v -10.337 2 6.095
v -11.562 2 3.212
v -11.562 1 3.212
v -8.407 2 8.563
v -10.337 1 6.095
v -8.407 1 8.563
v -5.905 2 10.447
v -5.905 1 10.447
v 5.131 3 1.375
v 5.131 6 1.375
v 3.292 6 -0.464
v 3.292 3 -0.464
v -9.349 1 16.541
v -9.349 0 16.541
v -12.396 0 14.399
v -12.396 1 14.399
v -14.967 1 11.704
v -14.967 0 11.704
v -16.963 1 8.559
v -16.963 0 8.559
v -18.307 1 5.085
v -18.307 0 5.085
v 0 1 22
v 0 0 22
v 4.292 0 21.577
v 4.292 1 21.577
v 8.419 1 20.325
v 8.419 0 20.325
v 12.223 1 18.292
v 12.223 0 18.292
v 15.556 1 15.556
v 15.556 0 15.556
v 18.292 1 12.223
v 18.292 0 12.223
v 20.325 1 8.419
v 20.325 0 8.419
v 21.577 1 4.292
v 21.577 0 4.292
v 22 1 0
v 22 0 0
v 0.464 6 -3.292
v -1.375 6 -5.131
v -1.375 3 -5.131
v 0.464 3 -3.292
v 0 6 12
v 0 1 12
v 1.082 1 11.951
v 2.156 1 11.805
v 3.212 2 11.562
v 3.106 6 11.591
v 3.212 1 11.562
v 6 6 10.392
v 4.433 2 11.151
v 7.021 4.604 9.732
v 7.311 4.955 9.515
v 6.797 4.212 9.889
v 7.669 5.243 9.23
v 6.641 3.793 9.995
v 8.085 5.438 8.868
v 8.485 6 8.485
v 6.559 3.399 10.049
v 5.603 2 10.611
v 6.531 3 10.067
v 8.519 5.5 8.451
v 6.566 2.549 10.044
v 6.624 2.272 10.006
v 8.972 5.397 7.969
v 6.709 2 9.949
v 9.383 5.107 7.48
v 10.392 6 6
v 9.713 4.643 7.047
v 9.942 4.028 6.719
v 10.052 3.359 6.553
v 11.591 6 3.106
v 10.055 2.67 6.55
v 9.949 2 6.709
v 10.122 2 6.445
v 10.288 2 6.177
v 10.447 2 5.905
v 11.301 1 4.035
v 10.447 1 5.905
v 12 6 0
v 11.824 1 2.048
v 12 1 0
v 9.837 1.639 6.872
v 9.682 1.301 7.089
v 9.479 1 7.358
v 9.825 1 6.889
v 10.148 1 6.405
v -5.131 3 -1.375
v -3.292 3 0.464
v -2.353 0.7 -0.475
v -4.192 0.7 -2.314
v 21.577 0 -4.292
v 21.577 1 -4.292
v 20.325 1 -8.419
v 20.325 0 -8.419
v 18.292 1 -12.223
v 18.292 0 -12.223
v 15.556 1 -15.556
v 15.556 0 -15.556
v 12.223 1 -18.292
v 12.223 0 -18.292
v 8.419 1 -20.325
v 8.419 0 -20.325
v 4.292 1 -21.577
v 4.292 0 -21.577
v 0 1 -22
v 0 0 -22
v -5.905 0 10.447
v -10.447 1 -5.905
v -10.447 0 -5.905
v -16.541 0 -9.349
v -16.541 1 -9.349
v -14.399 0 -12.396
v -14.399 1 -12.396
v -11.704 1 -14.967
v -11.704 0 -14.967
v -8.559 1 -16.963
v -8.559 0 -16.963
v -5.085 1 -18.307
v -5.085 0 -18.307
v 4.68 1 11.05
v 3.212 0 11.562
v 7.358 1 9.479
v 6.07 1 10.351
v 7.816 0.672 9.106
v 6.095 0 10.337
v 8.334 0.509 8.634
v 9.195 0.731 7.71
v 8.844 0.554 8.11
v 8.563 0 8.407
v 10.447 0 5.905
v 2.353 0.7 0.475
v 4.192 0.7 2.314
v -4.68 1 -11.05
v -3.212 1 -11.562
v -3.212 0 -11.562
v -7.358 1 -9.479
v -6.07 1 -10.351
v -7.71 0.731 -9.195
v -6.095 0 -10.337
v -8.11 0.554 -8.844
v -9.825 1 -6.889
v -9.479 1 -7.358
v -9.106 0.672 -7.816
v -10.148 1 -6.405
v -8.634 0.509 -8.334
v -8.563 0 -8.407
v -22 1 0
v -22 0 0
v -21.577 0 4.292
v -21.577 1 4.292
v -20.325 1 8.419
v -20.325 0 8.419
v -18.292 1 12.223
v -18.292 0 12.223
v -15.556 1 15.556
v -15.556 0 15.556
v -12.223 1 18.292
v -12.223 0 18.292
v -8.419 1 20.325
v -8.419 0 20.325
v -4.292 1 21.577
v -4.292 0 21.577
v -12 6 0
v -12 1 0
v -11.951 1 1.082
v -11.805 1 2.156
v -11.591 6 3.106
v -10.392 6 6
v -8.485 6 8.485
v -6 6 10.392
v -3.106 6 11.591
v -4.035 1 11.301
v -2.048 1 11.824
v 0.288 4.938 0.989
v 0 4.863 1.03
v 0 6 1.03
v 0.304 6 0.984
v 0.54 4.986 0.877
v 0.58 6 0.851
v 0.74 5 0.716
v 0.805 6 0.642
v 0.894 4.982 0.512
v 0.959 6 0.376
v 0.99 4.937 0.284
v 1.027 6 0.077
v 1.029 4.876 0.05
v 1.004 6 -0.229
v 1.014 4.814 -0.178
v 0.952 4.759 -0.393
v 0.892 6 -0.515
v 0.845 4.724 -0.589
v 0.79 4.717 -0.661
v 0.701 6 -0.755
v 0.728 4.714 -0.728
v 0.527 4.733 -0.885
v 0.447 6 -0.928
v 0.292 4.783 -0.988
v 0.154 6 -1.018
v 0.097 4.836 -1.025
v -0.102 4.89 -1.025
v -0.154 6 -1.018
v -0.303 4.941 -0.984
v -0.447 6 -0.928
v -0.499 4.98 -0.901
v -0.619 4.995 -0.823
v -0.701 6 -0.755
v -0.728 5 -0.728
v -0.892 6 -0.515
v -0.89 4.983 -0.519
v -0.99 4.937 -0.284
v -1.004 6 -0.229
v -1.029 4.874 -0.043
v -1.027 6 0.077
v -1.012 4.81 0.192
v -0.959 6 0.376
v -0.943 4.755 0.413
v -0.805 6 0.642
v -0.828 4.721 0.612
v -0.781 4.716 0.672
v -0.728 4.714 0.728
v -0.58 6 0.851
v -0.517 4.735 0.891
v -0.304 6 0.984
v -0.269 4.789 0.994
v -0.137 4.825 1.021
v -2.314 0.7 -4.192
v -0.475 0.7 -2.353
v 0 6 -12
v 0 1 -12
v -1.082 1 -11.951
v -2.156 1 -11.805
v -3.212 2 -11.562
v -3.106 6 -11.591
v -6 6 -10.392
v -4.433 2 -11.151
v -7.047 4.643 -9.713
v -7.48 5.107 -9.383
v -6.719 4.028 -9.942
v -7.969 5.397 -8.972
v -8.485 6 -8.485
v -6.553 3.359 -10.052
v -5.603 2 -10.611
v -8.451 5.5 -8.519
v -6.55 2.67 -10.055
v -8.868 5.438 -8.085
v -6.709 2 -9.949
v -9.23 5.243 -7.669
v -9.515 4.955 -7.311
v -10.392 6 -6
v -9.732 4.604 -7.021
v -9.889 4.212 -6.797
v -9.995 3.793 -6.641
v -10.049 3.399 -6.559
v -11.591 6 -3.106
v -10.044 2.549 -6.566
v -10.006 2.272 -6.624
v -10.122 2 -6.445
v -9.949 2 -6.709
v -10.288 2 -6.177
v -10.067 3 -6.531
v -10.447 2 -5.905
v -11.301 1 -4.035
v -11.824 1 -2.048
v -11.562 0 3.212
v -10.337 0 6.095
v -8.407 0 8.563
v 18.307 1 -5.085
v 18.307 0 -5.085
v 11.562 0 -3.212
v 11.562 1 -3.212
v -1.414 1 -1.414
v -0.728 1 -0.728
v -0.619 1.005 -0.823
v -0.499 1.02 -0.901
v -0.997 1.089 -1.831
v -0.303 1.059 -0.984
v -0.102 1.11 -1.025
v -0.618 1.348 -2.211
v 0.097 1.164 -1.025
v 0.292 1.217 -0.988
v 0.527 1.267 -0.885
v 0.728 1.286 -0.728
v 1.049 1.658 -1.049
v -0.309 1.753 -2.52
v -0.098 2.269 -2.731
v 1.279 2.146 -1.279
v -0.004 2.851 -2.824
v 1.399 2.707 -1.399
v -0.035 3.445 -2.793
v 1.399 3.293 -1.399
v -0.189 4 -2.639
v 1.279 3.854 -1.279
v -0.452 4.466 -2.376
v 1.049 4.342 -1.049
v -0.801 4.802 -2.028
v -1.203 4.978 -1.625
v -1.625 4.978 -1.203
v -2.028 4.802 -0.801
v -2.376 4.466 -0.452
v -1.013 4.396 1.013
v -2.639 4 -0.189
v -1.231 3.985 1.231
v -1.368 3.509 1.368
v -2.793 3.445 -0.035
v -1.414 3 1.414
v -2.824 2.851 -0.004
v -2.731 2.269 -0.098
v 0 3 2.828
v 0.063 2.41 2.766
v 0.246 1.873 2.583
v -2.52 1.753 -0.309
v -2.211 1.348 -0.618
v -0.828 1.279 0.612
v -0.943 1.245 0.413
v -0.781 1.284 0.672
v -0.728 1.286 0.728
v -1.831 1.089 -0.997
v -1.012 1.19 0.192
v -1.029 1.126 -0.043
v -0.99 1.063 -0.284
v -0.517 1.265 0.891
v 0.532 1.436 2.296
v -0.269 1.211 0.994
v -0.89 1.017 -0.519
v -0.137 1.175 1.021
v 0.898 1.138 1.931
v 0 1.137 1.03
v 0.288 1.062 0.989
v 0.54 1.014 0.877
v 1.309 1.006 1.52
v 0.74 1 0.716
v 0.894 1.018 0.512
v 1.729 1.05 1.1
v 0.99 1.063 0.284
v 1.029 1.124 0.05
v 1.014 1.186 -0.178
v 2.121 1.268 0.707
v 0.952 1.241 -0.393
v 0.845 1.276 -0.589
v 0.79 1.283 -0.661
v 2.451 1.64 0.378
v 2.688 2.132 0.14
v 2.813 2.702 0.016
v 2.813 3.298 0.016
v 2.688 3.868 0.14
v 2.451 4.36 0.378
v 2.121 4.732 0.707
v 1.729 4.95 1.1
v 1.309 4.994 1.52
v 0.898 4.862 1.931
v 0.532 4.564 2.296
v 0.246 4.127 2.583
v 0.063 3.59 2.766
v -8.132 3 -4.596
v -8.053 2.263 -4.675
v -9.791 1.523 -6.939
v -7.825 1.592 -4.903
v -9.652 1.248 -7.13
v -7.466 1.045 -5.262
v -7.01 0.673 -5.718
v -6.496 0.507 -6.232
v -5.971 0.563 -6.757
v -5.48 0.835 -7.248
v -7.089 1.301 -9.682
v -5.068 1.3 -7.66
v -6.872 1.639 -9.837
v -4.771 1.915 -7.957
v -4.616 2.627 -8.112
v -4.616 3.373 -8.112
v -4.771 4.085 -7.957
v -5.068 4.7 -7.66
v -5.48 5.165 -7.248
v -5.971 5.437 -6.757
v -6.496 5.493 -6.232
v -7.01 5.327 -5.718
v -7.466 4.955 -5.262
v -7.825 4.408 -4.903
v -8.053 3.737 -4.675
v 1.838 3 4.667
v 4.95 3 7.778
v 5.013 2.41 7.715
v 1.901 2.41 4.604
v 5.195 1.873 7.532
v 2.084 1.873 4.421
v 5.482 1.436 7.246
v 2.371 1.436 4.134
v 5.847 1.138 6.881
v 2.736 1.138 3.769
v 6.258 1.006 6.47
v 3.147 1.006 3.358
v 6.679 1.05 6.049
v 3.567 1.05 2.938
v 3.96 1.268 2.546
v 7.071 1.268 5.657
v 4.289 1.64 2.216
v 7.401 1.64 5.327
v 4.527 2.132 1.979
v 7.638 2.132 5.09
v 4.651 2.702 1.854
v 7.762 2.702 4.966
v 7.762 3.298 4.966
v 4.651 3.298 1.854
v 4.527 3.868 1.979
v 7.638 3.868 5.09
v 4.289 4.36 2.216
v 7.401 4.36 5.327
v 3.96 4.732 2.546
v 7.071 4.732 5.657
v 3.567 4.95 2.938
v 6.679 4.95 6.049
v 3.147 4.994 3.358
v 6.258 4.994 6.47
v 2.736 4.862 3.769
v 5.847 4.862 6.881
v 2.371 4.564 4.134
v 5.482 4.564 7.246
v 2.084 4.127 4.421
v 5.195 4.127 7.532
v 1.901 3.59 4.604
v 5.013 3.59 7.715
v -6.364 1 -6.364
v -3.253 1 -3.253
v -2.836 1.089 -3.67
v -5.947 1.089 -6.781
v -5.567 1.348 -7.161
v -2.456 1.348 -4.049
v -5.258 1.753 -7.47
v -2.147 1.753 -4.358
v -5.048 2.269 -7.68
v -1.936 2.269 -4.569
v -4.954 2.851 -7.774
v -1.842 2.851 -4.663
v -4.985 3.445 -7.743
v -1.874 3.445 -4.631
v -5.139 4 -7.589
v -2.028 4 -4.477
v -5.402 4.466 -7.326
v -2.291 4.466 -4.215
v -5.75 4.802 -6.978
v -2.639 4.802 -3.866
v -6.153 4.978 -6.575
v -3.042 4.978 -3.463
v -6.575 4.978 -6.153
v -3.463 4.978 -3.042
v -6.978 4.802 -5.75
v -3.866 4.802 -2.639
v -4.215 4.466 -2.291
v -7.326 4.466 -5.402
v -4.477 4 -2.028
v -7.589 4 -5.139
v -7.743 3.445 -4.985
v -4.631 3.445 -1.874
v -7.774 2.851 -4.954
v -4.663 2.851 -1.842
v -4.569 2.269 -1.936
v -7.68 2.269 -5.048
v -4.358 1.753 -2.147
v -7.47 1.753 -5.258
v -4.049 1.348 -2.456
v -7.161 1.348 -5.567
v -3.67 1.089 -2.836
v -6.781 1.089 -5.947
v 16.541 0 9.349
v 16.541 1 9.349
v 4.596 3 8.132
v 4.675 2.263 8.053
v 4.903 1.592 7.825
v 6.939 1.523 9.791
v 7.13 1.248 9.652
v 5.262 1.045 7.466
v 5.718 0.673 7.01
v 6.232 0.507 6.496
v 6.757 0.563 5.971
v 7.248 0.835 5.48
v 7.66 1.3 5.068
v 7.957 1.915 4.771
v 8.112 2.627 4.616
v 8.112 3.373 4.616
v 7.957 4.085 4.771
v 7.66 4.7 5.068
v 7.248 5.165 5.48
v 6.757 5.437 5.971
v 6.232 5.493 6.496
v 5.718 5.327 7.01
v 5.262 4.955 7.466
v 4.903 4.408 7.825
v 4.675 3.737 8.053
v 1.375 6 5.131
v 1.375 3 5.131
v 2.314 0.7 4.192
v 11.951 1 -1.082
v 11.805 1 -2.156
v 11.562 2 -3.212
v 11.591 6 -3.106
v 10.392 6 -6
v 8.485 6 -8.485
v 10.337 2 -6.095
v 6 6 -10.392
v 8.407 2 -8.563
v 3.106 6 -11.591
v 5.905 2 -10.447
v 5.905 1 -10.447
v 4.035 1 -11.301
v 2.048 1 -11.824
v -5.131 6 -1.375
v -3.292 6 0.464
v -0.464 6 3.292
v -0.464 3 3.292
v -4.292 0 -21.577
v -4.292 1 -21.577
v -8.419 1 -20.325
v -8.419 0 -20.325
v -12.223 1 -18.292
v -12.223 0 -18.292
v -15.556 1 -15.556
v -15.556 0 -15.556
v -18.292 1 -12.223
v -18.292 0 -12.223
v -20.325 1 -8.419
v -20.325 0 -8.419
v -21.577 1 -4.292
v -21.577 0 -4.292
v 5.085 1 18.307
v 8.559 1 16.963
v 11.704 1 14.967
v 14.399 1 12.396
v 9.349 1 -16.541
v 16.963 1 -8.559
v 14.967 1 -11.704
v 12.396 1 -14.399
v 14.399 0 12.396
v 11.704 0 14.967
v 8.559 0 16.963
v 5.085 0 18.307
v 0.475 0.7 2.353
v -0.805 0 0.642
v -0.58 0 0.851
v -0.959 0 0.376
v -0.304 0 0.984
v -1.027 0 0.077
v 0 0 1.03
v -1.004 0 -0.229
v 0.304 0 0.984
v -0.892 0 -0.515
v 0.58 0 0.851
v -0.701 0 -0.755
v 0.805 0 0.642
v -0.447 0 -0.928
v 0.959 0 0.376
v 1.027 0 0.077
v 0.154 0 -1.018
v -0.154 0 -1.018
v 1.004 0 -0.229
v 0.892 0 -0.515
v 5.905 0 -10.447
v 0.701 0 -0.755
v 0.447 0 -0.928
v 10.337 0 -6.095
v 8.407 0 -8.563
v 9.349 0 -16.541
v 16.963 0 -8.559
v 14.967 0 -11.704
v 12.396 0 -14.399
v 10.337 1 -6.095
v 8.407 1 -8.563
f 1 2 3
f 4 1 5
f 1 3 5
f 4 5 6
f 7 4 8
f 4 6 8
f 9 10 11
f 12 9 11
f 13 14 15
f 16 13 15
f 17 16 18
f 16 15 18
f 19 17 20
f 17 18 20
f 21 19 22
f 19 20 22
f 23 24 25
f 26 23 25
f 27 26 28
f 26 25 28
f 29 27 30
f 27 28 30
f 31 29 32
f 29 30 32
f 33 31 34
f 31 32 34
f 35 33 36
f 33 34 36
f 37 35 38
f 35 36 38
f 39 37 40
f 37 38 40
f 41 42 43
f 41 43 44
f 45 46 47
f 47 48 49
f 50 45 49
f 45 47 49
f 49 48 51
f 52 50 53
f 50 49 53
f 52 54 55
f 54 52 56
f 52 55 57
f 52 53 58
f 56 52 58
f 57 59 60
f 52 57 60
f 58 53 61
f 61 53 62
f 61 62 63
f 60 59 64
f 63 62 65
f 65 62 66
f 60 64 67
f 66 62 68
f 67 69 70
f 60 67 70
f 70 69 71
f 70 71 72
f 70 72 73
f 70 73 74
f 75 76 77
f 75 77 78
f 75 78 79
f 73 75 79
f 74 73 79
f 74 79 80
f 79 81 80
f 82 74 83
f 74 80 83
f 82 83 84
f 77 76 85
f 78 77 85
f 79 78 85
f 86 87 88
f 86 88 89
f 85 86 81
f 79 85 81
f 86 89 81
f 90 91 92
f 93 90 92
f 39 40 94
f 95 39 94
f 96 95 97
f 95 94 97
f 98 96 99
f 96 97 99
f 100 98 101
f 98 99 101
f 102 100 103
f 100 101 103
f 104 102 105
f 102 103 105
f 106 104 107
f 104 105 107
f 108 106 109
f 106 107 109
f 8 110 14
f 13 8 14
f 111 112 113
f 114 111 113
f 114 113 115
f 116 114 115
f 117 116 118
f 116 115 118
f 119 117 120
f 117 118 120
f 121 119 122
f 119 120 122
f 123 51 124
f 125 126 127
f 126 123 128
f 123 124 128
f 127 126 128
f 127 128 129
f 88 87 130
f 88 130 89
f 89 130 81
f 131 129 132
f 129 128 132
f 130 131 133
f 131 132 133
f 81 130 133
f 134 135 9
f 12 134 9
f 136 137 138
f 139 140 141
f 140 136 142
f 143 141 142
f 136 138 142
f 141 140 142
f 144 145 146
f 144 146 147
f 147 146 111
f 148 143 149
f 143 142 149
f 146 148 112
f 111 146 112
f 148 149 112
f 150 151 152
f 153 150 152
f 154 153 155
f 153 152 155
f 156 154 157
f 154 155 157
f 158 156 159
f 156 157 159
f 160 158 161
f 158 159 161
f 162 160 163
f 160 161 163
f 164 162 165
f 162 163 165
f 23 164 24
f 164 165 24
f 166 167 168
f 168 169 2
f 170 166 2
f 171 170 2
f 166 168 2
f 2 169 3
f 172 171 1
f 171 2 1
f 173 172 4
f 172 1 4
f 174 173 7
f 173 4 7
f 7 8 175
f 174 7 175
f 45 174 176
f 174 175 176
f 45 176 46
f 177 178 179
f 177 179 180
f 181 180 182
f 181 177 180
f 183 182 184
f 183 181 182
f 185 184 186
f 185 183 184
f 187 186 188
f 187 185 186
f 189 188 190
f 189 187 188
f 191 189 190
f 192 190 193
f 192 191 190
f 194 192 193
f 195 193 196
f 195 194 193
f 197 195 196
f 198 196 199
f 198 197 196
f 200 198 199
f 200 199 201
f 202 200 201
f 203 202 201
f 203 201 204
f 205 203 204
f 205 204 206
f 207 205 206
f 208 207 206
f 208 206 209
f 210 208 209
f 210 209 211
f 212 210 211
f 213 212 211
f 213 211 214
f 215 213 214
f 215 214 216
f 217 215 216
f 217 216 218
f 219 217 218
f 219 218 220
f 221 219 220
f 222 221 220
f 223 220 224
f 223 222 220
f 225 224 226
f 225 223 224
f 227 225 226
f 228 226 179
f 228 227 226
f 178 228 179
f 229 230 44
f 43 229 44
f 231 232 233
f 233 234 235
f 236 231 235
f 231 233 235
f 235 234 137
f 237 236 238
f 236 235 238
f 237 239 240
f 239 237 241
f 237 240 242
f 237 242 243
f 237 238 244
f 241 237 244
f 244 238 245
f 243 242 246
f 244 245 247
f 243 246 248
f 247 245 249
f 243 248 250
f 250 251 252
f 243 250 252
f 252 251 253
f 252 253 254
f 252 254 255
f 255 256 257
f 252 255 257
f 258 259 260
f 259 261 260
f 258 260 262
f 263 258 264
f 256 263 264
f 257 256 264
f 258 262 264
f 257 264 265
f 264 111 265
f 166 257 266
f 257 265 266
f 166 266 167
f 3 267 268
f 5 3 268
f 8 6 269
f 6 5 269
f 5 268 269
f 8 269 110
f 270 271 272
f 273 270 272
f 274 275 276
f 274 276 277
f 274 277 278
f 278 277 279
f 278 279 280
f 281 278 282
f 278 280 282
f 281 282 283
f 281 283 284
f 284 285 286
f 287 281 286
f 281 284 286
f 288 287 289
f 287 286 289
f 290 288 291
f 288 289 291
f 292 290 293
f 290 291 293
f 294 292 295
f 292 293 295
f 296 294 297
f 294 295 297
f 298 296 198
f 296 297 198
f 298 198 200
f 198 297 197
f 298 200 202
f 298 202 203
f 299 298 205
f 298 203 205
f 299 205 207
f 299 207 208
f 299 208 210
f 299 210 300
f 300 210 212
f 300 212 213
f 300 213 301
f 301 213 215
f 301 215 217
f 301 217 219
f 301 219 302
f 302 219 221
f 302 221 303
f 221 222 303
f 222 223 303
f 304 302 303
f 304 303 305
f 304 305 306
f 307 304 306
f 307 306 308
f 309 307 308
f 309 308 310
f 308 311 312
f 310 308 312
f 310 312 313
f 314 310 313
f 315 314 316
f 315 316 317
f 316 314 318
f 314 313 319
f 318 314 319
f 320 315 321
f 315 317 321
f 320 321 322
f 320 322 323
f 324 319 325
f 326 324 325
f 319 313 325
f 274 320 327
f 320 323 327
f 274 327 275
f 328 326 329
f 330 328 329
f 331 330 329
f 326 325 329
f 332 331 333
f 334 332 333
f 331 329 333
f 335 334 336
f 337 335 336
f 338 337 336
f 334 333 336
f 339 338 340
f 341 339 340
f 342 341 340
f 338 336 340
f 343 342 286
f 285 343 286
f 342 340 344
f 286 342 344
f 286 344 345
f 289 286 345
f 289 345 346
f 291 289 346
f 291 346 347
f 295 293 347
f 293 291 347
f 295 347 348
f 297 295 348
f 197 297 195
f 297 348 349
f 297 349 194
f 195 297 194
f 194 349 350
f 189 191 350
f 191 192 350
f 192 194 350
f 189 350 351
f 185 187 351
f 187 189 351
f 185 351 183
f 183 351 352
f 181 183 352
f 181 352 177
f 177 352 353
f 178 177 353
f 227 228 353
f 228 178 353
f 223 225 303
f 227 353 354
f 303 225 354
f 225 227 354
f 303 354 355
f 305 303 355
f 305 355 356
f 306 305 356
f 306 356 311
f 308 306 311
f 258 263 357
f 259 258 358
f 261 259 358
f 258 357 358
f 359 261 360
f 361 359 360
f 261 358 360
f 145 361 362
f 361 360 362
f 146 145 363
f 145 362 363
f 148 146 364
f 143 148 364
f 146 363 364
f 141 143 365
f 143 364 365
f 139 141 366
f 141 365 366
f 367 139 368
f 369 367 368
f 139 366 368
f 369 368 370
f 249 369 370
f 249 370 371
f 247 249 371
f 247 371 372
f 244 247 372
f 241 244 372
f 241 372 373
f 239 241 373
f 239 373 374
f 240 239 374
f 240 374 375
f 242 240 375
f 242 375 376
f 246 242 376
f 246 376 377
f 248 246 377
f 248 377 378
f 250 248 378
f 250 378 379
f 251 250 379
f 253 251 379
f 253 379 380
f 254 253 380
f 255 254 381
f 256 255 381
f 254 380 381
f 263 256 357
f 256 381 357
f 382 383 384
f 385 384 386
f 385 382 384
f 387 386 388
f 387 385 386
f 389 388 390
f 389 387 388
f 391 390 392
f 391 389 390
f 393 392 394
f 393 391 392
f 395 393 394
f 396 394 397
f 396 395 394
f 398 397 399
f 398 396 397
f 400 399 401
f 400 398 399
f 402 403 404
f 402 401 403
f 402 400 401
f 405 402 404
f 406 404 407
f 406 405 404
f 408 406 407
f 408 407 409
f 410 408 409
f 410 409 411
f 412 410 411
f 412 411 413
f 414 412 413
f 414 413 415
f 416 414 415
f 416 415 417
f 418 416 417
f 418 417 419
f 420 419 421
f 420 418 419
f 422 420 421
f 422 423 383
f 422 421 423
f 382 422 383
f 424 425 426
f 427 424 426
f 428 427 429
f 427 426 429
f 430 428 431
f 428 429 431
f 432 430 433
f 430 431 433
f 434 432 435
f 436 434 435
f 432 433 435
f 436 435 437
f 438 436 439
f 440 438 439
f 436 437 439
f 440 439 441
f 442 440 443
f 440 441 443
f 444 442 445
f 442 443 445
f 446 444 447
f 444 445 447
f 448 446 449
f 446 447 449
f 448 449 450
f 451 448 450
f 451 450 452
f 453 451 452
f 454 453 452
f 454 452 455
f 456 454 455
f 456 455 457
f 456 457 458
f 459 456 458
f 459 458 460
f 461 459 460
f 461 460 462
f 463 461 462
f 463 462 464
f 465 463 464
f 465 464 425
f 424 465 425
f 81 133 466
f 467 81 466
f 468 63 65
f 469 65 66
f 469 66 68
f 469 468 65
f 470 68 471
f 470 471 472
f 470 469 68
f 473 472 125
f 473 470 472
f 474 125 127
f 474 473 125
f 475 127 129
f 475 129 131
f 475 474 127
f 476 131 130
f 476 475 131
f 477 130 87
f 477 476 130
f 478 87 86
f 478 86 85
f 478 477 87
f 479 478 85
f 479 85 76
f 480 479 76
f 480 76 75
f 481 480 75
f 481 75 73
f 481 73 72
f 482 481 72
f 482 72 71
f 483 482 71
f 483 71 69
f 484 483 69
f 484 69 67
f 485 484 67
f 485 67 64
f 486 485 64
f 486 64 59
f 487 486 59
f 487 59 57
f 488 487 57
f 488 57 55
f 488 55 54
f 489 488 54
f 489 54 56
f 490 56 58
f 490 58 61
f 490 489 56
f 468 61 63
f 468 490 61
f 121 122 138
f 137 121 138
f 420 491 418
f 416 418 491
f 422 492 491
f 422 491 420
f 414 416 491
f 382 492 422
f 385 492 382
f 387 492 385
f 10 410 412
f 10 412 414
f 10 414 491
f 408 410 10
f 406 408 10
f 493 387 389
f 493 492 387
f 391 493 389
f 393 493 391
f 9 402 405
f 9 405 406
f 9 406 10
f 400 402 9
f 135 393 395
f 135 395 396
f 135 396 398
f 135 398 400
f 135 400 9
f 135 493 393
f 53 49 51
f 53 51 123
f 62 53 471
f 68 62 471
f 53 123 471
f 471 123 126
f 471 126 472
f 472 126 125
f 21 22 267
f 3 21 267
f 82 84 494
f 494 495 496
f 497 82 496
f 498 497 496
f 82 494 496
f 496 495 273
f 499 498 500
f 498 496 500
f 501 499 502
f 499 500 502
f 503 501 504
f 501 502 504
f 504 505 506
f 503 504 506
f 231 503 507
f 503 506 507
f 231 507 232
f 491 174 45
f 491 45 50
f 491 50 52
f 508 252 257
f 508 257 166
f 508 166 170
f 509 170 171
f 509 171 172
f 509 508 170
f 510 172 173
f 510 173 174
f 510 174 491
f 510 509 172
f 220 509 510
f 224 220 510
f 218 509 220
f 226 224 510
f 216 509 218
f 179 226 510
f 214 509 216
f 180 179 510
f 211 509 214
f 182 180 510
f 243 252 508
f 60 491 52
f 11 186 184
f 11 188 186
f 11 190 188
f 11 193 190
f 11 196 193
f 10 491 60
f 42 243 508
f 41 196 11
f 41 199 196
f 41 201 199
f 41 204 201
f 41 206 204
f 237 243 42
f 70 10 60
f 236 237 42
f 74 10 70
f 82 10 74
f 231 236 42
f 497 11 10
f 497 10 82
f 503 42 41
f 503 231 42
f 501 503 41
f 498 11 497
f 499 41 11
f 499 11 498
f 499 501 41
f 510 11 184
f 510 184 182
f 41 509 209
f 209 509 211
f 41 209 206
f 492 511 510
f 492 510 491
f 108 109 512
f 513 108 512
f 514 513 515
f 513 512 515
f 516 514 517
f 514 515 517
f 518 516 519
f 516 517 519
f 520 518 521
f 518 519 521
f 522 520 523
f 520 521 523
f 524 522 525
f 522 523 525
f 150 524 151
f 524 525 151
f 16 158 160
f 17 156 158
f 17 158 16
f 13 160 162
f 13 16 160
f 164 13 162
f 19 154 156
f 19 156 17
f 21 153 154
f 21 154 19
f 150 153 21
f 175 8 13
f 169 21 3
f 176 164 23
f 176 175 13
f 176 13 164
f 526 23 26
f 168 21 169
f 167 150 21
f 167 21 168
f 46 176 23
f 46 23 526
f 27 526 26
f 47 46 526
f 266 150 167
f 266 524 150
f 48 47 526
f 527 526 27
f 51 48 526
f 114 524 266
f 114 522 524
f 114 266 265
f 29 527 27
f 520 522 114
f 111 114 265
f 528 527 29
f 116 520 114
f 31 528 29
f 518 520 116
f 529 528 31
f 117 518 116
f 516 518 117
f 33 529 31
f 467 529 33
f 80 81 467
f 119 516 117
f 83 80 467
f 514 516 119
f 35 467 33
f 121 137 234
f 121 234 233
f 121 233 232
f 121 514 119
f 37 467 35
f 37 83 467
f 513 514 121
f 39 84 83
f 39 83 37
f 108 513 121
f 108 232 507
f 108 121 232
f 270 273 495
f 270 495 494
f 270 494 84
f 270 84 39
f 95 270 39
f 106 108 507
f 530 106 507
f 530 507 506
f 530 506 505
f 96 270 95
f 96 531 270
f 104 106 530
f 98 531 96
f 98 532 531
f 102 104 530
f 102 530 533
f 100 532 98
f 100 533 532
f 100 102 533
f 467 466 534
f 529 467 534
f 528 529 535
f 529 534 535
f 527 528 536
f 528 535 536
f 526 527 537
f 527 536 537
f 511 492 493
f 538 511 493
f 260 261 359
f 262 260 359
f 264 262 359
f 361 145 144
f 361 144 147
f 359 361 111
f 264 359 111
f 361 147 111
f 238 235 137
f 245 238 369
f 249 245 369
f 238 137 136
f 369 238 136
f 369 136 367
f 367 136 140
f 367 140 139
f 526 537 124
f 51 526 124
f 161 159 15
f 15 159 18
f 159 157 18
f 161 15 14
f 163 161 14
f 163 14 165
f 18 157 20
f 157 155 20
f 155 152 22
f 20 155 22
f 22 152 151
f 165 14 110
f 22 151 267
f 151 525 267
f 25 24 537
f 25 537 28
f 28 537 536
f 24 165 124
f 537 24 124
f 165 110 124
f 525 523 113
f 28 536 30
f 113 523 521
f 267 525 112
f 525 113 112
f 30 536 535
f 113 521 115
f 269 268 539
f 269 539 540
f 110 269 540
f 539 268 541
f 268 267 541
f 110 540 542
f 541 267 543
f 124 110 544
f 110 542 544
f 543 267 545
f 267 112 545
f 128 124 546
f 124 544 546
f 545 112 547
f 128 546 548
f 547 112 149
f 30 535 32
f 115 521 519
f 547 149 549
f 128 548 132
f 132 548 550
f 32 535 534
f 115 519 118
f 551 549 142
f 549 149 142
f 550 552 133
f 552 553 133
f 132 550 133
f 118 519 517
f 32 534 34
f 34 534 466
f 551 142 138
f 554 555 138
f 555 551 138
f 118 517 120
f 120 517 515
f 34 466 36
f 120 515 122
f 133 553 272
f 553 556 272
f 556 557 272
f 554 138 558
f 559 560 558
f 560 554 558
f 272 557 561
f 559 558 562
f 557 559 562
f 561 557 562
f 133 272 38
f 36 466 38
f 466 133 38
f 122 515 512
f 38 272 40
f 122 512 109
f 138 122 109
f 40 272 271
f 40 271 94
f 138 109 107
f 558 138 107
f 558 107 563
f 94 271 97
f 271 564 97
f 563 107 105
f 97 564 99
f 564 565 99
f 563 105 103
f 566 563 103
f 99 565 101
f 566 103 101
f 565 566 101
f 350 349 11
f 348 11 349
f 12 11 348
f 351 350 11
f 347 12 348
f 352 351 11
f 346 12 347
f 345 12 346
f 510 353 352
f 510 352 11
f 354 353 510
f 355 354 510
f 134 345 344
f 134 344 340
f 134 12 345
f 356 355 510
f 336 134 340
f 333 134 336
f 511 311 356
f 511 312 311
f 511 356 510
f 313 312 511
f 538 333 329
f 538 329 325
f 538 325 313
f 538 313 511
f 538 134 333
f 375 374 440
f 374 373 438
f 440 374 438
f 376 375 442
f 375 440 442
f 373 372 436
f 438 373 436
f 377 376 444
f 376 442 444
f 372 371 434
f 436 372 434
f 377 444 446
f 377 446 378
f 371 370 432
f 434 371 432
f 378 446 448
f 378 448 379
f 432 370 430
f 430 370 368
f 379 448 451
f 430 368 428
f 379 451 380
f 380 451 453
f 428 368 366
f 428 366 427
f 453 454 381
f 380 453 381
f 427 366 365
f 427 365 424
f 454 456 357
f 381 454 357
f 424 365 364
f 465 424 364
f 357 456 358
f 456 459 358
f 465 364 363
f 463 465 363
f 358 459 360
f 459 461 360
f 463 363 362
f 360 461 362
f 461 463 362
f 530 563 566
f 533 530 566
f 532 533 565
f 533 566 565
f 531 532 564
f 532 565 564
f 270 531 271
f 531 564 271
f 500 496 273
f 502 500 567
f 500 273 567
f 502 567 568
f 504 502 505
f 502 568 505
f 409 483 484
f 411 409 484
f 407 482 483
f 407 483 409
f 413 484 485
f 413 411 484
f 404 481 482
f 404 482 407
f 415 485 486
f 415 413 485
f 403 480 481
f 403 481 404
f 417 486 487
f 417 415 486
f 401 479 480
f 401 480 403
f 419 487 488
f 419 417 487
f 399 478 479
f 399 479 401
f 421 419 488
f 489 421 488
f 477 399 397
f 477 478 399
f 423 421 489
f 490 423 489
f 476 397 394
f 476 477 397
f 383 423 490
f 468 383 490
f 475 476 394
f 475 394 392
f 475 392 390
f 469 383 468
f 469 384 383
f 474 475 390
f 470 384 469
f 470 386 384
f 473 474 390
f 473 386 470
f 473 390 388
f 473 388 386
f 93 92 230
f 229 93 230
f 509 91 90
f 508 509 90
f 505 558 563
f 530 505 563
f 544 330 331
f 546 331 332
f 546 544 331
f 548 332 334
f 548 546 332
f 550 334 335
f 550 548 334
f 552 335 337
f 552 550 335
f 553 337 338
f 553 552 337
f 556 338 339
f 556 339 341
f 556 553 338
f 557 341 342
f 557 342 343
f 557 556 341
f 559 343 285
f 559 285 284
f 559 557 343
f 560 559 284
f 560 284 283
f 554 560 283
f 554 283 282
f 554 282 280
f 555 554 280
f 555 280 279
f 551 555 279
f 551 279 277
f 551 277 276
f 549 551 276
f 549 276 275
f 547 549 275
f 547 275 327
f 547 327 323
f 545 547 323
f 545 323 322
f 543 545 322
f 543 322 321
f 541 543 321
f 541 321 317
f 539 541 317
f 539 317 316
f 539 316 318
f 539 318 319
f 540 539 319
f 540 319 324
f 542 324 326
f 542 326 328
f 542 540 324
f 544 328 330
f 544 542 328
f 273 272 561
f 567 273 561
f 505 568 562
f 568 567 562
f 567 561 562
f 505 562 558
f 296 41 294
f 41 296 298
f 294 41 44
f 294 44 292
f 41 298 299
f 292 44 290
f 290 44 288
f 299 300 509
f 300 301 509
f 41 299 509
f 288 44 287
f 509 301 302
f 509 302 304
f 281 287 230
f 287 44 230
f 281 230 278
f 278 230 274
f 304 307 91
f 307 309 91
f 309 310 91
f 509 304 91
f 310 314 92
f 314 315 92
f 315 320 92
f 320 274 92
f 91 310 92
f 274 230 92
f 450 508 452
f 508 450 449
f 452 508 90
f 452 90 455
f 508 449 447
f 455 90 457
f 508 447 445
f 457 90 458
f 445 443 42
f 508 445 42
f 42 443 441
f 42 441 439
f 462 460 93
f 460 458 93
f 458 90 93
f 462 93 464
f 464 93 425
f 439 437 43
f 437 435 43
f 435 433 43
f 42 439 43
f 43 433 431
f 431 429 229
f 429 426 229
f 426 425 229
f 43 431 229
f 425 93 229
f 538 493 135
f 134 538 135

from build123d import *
from build123d.topology import SkipClean

# Parameters (mm, degrees)
SALIENTE_EXTRUIR4_DEPTH    = 6
CROQUIS10_R                = 1.03
SALIENTE_EXTRUIR5_DEPTH    = 3
CROQUIS10_3_R              = 1.03
CORTAR_EXTRUIR7_DEPTH      = 6
CORTAR_EXTRUIR8_REACH      = 20
CORTAR_EXTRUIR8_END_RADIUS = 12
CROQUIS11_R                = 2
CORTAR_EXTRUIR11_START     = 9
CROQUIS11_3_R              = 2.5
CORTAR_EXTRUIR11_DEPTH     = 10.000000167
CORTAR_EXTRUIR9_START      = 4.6
CORTAR_EXTRUIR9_DEPTH      = 2.6
CORTAR_EXTRUIR12_REACH     = 20
CORTAR_EXTRUIR10_START     = -3
CORTAR_EXTRUIR10_DEPTH     = 3
CORTAR_EXTRUIR13_START     = -9
CROQUIS11_5_R              = 2.5
CORTAR_EXTRUIR13_DEPTH     = 10.000000167
CORTAR_EXTRUIR14_START     = -2
CORTAR_EXTRUIR14_DEPTH     = 2.6
CORTAR_EXTRUIR15_START     = -3
CORTAR_EXTRUIR15_DEPTH     = 3
SALIENTE_EXTRUIR6_DEPTH    = 1
CORTAR_EXTRUIR17_DEPTH     = 2


with BuildPart() as part:
    # Croquis1 → Saliente-Extruir4 (new body)
    with BuildSketch(Plane(origin=(0, 0, 0), x_dir=(1, 0, 0), z_dir=(0, 1, 0))):
        with BuildLine():
            Line((0, -12), (0, 0))
            Line((0, 0), (-12, 0))
            ThreePointArc((-12, 0), (-8.485281374, -8.485281374), (0, -12))
        make_face()
        with BuildLine():
            Line((-12, 0), (0, 0))
            Line((0, 0), (0, 12))
            ThreePointArc((0, 12), (-8.485281374, 8.485281374), (-12, 0))
        make_face()
        with BuildLine():
            Line((0, 12), (0, 0))
            Line((0, 0), (12, 0))
            ThreePointArc((12, 0), (8.485281374, 8.485281374), (0, 12))
        make_face()
        with BuildLine():
            Line((12, 0), (0, 0))
            Line((0, 0), (0, -12))
            ThreePointArc((0, -12), (8.485281374, -8.485281374), (12, 0))
        make_face()
    extrude(amount=SALIENTE_EXTRUIR4_DEPTH)

    # Croquis10 → Saliente-Extruir5 (add)
    with BuildSketch(Plane(origin=(0, 0, 0), x_dir=(1, 0, 0), z_dir=(0, 1, 0))):
        Circle(CROQUIS10_R)
    extrude(amount=SALIENTE_EXTRUIR5_DEPTH)

    # Croquis10<3> → Cortar-Extruir7 (cut)
    with BuildSketch(Plane(origin=(0, 0, 0), x_dir=(1, 0, 0), z_dir=(0, 1, 0))):
        with Locations(Location((0, 0, 0), (0, 0, 270))):
            Circle(CROQUIS10_3_R)
    extrude(amount=CORTAR_EXTRUIR7_DEPTH, mode=Mode.SUBTRACT)

    # Cortar-Extruir8: up to this cylinder (the profile starts inside it)
    cortar_extruir8_end = Plane(origin=(0, 3, 0), z_dir=(0, -1, 0)) * Cylinder(CORTAR_EXTRUIR8_END_RADIUS, 65, mode=Mode.PRIVATE)
    # Croquis11 → Cortar-Extruir8 (cut, up to the surface)
    with BuildSketch(Plane(origin=(0, 0, 0), x_dir=(0.7071067811865477, 0, -0.7071067811865475), z_dir=(0.7071067811865475, 0, 0.7071067811865477)), mode=Mode.PRIVATE) as cortar_extruir8_sk1:
        with Locations(Location((0, 3, 0), (0, 0, 180))):
            Circle(CROQUIS11_R)
    cortar_extruir8_tool1 = extrude(cortar_extruir8_sk1.sketch, amount=CORTAR_EXTRUIR8_REACH, mode=Mode.PRIVATE) & cortar_extruir8_end
    add(cortar_extruir8_tool1.solids().sort_by_distance((0, 3, 0))[0], mode=Mode.SUBTRACT)

    # Croquis11<3> → Cortar-Extruir11 (cut, through all)
    with BuildSketch(Plane(origin=(0, 0, 0), x_dir=(0.7071067811865477, 0, -0.7071067811865475), z_dir=(0.7071067811865475, 0, 0.7071067811865477)).offset(CORTAR_EXTRUIR11_START)):
        with Locations(Location((0, 3, 0), (0, 0, 180))):
            Circle(CROQUIS11_3_R)
    extrude(amount=CORTAR_EXTRUIR11_DEPTH, mode=Mode.SUBTRACT)

    # Croquis14 → Cortar-Extruir9 (cut)
    with BuildSketch(Plane(origin=(0, 0, 0), x_dir=(0.7071067811865477, 0, -0.7071067811865475), z_dir=(0.7071067811865475, 0, 0.7071067811865477)).offset(CORTAR_EXTRUIR9_START)):
        Polygon((1.327905619, 5.3), (-1.327905619, 5.3), (-2.655811238, 3), (-1.327905619, 0.7), (1.327905619, 0.7), (2.655811238, 3), align=None)
    extrude(amount=-CORTAR_EXTRUIR9_DEPTH, mode=Mode.SUBTRACT)

    # Croquis11<4> → Cortar-Extruir12 (cut, up to next)
    with BuildSketch(Plane(origin=(0, 0, 0), x_dir=(0.7071067811865477, 0, -0.7071067811865475), z_dir=(0.7071067811865475, 0, 0.7071067811865477)), mode=Mode.PRIVATE) as cortar_extruir12_sk1:
        with BuildLine():
            ThreePointArc((2, 3), (1.414213562, 4.414213562), (0, 5))
            Line((0, 5), (0, 1))
            ThreePointArc((0, 1), (1.414213562, 1.585786438), (2, 3))
        make_face()
    cortar_extruir12_tool1 = extrude(cortar_extruir12_sk1.sketch, amount=-CORTAR_EXTRUIR12_REACH, mode=Mode.PRIVATE) & part.part
    # Croquis11<4> → Cortar-Extruir12 (cut, up to next)
    with BuildSketch(Plane(origin=(0, 0, 0), x_dir=(0.7071067811865477, 0, -0.7071067811865475), z_dir=(0.7071067811865475, 0, 0.7071067811865477)), mode=Mode.PRIVATE) as cortar_extruir12_sk2:
        with BuildLine():
            Line((0, 1), (0, 5))
            ThreePointArc((0, 5), (-2, 3), (0, 1))
        make_face()
    cortar_extruir12_tool2 = extrude(cortar_extruir12_sk2.sketch, amount=-CORTAR_EXTRUIR12_REACH, mode=Mode.PRIVATE) & part.part
    # Croquis11<4> → Cortar-Extruir12 (cut, up to next)
    with BuildSketch(Plane(origin=(0, 0, 0), x_dir=(0.7071067811865477, 0, -0.7071067811865475), z_dir=(0.7071067811865475, 0, 0.7071067811865477)), mode=Mode.PRIVATE) as cortar_extruir12_sk3:
        with BuildLine():
            ThreePointArc((2, 3), (1.414213562, 4.414213562), (0, 5))
            Line((0, 5), (0, 1))
            ThreePointArc((0, 1), (1.414213562, 1.585786438), (2, 3))
        make_face()
    cortar_extruir12_tool3 = extrude(cortar_extruir12_sk3.sketch, amount=-CORTAR_EXTRUIR12_REACH, mode=Mode.PRIVATE) & part.part
    # Croquis11<4> → Cortar-Extruir12 (cut, up to next)
    with BuildSketch(Plane(origin=(0, 0, 0), x_dir=(0.7071067811865477, 0, -0.7071067811865475), z_dir=(0.7071067811865475, 0, 0.7071067811865477)), mode=Mode.PRIVATE) as cortar_extruir12_sk4:
        with BuildLine():
            Line((0, 1), (0, 5))
            ThreePointArc((0, 5), (-2, 3), (0, 1))
        make_face()
    cortar_extruir12_tool4 = extrude(cortar_extruir12_sk4.sketch, amount=-CORTAR_EXTRUIR12_REACH, mode=Mode.PRIVATE) & part.part
    add(cortar_extruir12_tool1.solids().sort_by_distance((0.600211, 3, -0.600211))[0], mode=Mode.SUBTRACT)
    add(cortar_extruir12_tool2.solids().sort_by_distance((-0.600211, 3, 0.600211))[0], mode=Mode.SUBTRACT)
    add(cortar_extruir12_tool3.solids().sort_by_distance((0.600211, 3, -0.600211))[0], mode=Mode.SUBTRACT)
    add(cortar_extruir12_tool4.solids().sort_by_distance((-0.600211, 3, 0.600211))[0], mode=Mode.SUBTRACT)

    # Croquis16 → Cortar-Extruir10 (cut)
    with SkipClean():  # the faces are left unmerged after this step: merging them gives an invalid solid
        with BuildSketch(Plane(origin=(0, 6, 0), x_dir=(1, 0, 0), z_dir=(0, 1, 0)).offset(CORTAR_EXTRUIR10_START)):
            Polygon((-0.463728574, -3.292155699), (1.374749057, -5.13063333), (5.13063333, -1.374749057), (3.292155699, 0.463728574), align=None)
        extrude(amount=CORTAR_EXTRUIR10_DEPTH, mode=Mode.SUBTRACT)

    # Croquis11<5> → Cortar-Extruir13 (cut, through all)
    with BuildSketch(Plane(origin=(0, 0, 0), x_dir=(0.7071067811865477, 0, -0.7071067811865475), z_dir=(0.7071067811865475, 0, 0.7071067811865477)).offset(CORTAR_EXTRUIR13_START)):
        with Locations(Location((0, 3, 0), (0, 0, 180))):
            Circle(CROQUIS11_5_R)
    extrude(amount=-CORTAR_EXTRUIR13_DEPTH, mode=Mode.SUBTRACT)

    # Croquis14<2> → Cortar-Extruir14 (cut)
    with BuildSketch(Plane(origin=(0, 0, 0), x_dir=(0.7071067811865477, 0, -0.7071067811865475), z_dir=(0.7071067811865475, 0, 0.7071067811865477)).offset(CORTAR_EXTRUIR14_START)):
        Polygon((1.327905619, 5.3), (-1.327905619, 5.3), (-2.655811238, 3), (-1.327905619, 0.7), (1.327905619, 0.7), (2.655811238, 3), align=None)
    extrude(amount=-CORTAR_EXTRUIR14_DEPTH, mode=Mode.SUBTRACT)

    # Croquis18 → Cortar-Extruir15 (cut)
    with BuildSketch(Plane(origin=(0, 6, 0), x_dir=(1, 0, 0), z_dir=(0, 1, 0)).offset(CORTAR_EXTRUIR15_START)):
        Polygon((0.463728574, 3.292155699), (-3.292155699, -0.463728574), (-5.13063333, 1.374749057), (-1.374749057, 5.13063333), align=None)
    extrude(amount=CORTAR_EXTRUIR15_DEPTH, mode=Mode.SUBTRACT)

    # Croquis1<11> → Saliente-Extruir6 (add)
    with BuildSketch(Plane(origin=(0, 0, 0), x_dir=(1, 0, 0), z_dir=(0, 1, 0))):
        with BuildLine():
            Line((0, 19), (0, 12))
            ThreePointArc((0, 12), (8.485281374, 8.485281374), (12, 0))
            Line((12, 0), (19, 0))
            ThreePointArc((19, 0), (13.435028843, 13.435028843), (0, 19))
        make_face()
        with BuildLine():
            Line((0, 22), (0, 19))
            ThreePointArc((0, 19), (13.435028843, 13.435028843), (19, 0))
            Line((19, 0), (22, 0))
            ThreePointArc((22, 0), (15.556349186, 15.556349186), (0, 22))
        make_face()
        with BuildLine():
            Line((0, -22), (0, -19))
            ThreePointArc((0, -19), (-13.435028843, -13.435028843), (-19, 0))
            Line((-19, 0), (-22, 0))
            ThreePointArc((-22, 0), (-15.556349186, -15.556349186), (0, -22))
        make_face()
        with BuildLine():
            Line((0, -19), (0, -12))
            ThreePointArc((0, -12), (-8.485281374, -8.485281374), (-12, 0))
            Line((-12, 0), (-19, 0))
            ThreePointArc((-19, 0), (-13.435028843, -13.435028843), (0, -19))
        make_face()
        with BuildLine():
            Line((22, 0), (19, 0))
            ThreePointArc((19, 0), (13.435028843, -13.435028843), (0, -19))
            Line((0, -19), (0, -22))
            ThreePointArc((0, -22), (15.556349186, -15.556349186), (22, 0))
        make_face()
        with BuildLine():
            ThreePointArc((-19, 0), (-13.435028843, 13.435028843), (0, 19))
            Line((0, 19), (0, 22))
            ThreePointArc((0, 22), (-15.556349186, 15.556349186), (-22, 0))
            Line((-22, 0), (-19, 0))
        make_face()
        with BuildLine():
            Line((19, 0), (12, 0))
            ThreePointArc((12, 0), (8.485281374, -8.485281374), (0, -12))
            Line((0, -12), (0, -19))
            ThreePointArc((0, -19), (13.435028843, -13.435028843), (19, 0))
        make_face()
        with BuildLine():
            ThreePointArc((-12, 0), (-8.485281374, 8.485281374), (0, 12))
            Line((0, 12), (0, 19))
            ThreePointArc((0, 19), (-13.435028843, 13.435028843), (-19, 0))
            Line((-19, 0), (-12, 0))
        make_face()
    extrude(amount=SALIENTE_EXTRUIR6_DEPTH)

    # Croquis20 → Cortar-Extruir17 (cut)
    with SkipClean():  # the faces are left unmerged after this step: merging them gives an invalid solid
        with BuildSketch(Plane.XZ):
            with BuildLine():
                Line((5.085233412, 18.306840283), (3.211726365, 11.562214916))
                ThreePointArc((3.211726365, 11.562214916), (7.391916343, 9.453019242), (10.446754065, 5.90468708))
                Line((10.446754065, 5.90468708), (16.540693936, 9.349087877))
                ThreePointArc((16.540693936, 9.349087877), (11.703867543, 14.967280466), (5.085233412, 18.306840283))
            make_face()
            with BuildLine():
                Line((18.306840283, -5.085233412), (11.562214916, -3.211726365))
                ThreePointArc((11.562214916, -3.211726365), (9.453019242, -7.391916343), (5.90468708, -10.446754065))
                Line((5.90468708, -10.446754065), (9.349087877, -16.540693936))
                ThreePointArc((9.349087877, -16.540693936), (14.967280466, -11.703867543), (18.306840283, -5.085233412))
            make_face()
            with BuildLine():
                Line((-5.085233412, -18.306840283), (-3.211726365, -11.562214916))
                ThreePointArc((-3.211726365, -11.562214916), (-7.391916343, -9.453019242), (-10.446754065, -5.90468708))
                Line((-10.446754065, -5.90468708), (-16.540693936, -9.349087877))
                ThreePointArc((-16.540693936, -9.349087877), (-11.703867543, -14.967280466), (-5.085233412, -18.306840283))
            make_face()
            with BuildLine():
                Line((-18.306840283, 5.085233412), (-11.562214916, 3.211726365))
                ThreePointArc((-11.562214916, 3.211726365), (-9.453019242, 7.391916343), (-5.90468708, 10.446754065))
                Line((-5.90468708, 10.446754065), (-9.349087877, 16.540693936))
                ThreePointArc((-9.349087877, 16.540693936), (-14.967280466, 11.703867543), (-18.306840283, 5.085233412))
            make_face()
        extrude(amount=-CORTAR_EXTRUIR17_DEPTH, mode=Mode.SUBTRACT)


solid = part.part
